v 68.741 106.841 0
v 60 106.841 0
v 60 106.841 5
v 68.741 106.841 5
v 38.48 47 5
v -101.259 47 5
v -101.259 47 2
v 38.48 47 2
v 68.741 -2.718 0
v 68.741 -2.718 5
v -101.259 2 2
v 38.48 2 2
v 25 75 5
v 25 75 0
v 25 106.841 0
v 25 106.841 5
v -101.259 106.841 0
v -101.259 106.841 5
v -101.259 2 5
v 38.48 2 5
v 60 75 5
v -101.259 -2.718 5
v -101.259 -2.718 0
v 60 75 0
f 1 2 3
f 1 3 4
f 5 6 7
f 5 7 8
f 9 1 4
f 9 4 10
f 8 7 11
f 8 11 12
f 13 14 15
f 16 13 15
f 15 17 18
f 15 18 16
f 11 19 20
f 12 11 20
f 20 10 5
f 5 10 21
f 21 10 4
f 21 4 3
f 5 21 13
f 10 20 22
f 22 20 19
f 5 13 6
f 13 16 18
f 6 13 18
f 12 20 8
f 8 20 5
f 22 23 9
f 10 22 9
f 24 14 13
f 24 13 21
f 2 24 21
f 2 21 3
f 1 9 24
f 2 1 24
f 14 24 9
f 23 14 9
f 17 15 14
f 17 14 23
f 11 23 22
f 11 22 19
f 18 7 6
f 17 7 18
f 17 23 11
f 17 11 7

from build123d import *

# Parameters (mm, degrees)
BOSS_EXTRUDE1_DEPTH = 5
SKETCH2_W           = 140
SKETCH2_H           = 45
CUT_EXTRUDE1_DEPTH  = 3
SKETCH3_W           = 35
SKETCH3_H           = 32
CUT_EXTRUDE3_DEPTH  = 148.286881187


with BuildPart() as part:
    # Sketch1 → Boss-Extrude1 (new body)
    with BuildSketch(Plane.XY):
        Polygon((0, -2.718152765), (-101.259492884, -2.718152765), (-101.259492884, 106.840724775), (68.740507116, 106.840724775), (68.740507116, -2.718152765), align=None)
    extrude(amount=BOSS_EXTRUDE1_DEPTH)

    # Sketch2 → Cut-Extrude1 (cut)
    with BuildSketch(Plane.XY.offset(5)):
        with Locations((-31.52, 24.5)):
            Rectangle(SKETCH2_W, SKETCH2_H)
    extrude(amount=-CUT_EXTRUDE1_DEPTH, mode=Mode.SUBTRACT)

    # Sketch3 → Cut-Extrude3 (cut, through all)
    with BuildSketch(Plane.XY):
        with Locations((42.5, 91)):
            Rectangle(SKETCH3_W, SKETCH3_H)
    extrude(amount=CUT_EXTRUDE3_DEPTH, mode=Mode.SUBTRACT)


solid = part.part
